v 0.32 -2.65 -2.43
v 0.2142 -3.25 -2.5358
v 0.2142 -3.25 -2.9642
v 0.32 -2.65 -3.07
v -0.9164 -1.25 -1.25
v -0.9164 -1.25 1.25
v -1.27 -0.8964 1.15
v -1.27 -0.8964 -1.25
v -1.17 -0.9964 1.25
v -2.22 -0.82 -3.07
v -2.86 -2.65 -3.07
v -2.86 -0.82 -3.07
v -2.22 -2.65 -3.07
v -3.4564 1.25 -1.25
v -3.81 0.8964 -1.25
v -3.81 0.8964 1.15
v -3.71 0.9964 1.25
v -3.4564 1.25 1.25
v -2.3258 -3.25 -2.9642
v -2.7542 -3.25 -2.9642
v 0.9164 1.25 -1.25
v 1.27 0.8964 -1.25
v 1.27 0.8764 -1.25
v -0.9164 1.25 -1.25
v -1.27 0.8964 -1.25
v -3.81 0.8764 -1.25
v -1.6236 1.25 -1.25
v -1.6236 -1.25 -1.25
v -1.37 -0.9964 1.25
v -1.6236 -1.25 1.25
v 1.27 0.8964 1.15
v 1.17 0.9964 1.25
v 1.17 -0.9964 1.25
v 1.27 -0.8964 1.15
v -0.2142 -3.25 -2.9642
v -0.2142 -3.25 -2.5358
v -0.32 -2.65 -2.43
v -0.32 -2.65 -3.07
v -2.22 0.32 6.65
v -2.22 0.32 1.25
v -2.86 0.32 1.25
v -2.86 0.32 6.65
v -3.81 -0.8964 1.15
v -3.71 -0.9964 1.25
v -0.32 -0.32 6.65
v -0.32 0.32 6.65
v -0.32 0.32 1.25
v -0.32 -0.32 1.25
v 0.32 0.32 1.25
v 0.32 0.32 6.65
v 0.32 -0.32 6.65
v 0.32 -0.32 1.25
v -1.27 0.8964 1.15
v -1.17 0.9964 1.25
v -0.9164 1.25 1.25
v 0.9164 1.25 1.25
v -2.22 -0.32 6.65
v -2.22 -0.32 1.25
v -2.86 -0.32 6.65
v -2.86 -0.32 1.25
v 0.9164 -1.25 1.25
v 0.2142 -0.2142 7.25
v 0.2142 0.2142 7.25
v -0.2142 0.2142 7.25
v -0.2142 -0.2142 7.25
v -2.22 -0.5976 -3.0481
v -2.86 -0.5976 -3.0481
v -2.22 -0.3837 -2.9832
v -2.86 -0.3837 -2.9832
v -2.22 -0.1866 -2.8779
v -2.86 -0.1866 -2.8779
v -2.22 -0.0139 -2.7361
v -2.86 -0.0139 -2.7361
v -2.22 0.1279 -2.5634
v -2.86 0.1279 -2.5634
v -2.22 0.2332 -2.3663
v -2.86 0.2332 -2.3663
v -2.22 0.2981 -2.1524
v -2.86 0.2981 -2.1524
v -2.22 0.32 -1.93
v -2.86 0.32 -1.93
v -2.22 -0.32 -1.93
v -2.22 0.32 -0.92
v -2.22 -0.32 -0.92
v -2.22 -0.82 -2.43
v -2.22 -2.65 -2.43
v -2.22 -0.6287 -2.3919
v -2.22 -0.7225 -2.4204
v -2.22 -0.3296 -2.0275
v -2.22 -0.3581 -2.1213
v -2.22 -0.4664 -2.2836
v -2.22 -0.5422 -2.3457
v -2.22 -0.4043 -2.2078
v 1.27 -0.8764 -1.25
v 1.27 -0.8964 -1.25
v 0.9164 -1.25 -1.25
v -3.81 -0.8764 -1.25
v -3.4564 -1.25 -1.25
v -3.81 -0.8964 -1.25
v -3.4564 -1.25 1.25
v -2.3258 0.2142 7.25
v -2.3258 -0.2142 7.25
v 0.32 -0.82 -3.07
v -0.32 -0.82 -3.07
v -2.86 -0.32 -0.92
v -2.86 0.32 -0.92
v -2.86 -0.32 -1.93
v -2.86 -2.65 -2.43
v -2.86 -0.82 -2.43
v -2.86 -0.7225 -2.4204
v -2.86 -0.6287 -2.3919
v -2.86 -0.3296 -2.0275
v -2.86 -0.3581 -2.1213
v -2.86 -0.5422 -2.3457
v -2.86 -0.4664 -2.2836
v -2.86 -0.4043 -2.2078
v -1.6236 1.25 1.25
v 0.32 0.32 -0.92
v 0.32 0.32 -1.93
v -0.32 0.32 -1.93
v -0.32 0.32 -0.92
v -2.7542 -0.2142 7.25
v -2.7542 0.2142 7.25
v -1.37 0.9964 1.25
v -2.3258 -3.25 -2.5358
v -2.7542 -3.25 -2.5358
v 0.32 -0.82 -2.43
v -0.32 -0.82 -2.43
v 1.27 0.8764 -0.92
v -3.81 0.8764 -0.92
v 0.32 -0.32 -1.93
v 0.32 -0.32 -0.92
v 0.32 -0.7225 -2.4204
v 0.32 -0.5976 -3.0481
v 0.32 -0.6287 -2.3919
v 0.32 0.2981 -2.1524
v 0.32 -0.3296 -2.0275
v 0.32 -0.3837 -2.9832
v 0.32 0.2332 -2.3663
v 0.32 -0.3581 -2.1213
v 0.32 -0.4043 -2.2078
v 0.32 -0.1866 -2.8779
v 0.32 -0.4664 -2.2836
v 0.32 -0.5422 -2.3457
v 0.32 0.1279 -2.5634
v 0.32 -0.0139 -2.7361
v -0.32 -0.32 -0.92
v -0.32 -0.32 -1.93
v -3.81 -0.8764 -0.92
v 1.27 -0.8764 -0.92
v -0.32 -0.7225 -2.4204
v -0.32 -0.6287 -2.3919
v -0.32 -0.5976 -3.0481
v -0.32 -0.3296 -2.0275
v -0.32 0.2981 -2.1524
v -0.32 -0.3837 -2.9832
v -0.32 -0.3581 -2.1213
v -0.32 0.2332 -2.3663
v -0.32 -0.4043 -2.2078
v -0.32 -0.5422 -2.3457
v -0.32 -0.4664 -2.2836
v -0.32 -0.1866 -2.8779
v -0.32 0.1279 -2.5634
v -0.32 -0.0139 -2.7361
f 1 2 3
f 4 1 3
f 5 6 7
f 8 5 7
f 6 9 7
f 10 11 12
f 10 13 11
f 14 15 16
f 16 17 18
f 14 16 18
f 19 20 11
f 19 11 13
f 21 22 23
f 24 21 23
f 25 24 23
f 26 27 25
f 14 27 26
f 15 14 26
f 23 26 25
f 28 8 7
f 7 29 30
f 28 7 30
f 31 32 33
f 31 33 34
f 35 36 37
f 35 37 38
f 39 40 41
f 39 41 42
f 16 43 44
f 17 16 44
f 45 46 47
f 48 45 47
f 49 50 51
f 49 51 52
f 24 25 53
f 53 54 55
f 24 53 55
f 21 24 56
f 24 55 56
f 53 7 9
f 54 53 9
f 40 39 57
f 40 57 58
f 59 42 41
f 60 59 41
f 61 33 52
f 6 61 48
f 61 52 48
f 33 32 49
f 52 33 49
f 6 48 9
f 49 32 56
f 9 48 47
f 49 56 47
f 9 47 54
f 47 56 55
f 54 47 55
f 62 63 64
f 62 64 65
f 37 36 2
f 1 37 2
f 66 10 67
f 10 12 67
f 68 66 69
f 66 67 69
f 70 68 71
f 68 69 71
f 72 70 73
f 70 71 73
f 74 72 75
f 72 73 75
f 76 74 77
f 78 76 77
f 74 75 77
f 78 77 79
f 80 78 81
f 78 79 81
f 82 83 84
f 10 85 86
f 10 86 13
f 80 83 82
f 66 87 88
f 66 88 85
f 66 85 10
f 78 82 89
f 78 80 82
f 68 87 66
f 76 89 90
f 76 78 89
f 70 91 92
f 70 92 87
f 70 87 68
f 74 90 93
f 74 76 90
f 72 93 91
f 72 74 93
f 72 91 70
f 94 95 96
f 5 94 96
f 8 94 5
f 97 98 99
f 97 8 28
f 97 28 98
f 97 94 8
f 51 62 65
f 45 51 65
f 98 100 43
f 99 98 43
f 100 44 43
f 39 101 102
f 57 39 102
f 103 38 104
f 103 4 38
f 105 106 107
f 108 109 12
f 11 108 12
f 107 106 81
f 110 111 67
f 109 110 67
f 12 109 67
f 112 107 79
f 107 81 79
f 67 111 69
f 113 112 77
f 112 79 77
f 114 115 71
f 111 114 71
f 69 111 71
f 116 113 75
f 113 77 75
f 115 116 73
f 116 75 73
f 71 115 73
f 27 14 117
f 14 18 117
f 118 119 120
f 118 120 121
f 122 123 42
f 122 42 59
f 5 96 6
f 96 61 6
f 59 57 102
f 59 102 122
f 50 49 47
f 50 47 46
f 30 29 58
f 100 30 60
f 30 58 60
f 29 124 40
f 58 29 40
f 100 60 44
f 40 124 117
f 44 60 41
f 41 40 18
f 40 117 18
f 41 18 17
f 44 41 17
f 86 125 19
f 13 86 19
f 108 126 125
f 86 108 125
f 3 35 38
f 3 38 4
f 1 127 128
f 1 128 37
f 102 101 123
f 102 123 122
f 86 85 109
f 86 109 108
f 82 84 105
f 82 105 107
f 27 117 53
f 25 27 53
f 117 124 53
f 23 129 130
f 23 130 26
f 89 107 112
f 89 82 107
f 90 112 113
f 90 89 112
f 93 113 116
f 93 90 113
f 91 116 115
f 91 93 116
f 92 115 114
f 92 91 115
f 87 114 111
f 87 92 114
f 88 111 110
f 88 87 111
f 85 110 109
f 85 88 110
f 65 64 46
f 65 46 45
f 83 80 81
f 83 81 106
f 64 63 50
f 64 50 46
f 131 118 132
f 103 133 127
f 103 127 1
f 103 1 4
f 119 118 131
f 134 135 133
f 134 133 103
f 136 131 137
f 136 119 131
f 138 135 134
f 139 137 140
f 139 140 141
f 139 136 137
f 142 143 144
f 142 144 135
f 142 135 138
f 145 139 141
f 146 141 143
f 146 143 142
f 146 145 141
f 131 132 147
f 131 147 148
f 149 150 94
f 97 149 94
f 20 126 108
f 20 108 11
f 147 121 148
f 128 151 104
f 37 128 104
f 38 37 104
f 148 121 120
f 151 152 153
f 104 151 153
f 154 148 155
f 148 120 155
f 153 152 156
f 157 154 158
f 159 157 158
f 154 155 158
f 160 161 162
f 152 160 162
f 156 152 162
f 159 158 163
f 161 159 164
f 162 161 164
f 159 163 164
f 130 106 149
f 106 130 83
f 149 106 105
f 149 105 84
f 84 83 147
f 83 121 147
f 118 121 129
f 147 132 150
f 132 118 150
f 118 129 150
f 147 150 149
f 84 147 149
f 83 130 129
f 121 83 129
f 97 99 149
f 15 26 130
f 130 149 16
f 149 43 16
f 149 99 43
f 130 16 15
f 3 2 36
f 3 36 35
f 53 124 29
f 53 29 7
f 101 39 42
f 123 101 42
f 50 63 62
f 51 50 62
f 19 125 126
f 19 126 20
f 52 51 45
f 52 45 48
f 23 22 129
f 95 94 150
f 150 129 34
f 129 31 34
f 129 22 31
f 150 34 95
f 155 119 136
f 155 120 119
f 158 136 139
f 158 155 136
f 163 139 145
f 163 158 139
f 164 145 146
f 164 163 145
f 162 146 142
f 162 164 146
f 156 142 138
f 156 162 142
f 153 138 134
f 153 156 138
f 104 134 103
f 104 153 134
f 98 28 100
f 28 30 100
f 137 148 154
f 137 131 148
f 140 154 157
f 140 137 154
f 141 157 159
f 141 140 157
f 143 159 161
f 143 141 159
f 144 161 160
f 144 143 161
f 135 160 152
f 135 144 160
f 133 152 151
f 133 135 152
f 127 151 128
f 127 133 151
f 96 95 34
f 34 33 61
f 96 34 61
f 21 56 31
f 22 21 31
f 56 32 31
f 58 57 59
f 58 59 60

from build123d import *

# Parameters (mm, degrees)
EXTRUDE1_DEPTH          = 1.25
CUT_EXTRUDE3_DEPTH      = 2.25
LPATTERN4_COUNT         = 2
LPATTERN4_PITCH         = 2.54
SKETCH2_W               = 1.752893218
SKETCH2_H               = 0.33
CUT_EXTRUDE1_DEPTH      = 2.27
CUT_EXTRUDE1_DEPTH_BACK = 4.81
EXTRUDE_THIN1_DEPTH     = 0.32
LPATTERN5_COUNT         = 2
LPATTERN5_PITCH         = 2.54
CHAMFER2_SIZE           = 0.6
CHAMFER2_SIZE2          = 0.105796188
CHAMFER2_PART_2_SIZE    = 0.6
CHAMFER2_PART_2_SIZE2   = 0.105796188
CHAMFER2_PART_3_SIZE    = 0.6
CHAMFER2_PART_3_SIZE2   = 0.105796188
CHAMFER2_PART_4_SIZE    = 0.6
CHAMFER2_PART_4_SIZE2   = 0.105796188
CHAMFER2_PART_5_SIZE    = 0.6
CHAMFER2_PART_5_SIZE2   = 0.105796188
CHAMFER2_PART_6_SIZE    = 0.6
CHAMFER2_PART_6_SIZE2   = 0.105796188
CHAMFER2_PART_7_SIZE    = 0.6
CHAMFER2_PART_7_SIZE2   = 0.105796188
CHAMFER2_PART_8_SIZE    = 0.6
CHAMFER2_PART_8_SIZE2   = 0.105796188
CHAMFER2_PART_9_SIZE    = 0.6
CHAMFER2_PART_9_SIZE2   = 0.105796188
CHAMFER2_PART_10_SIZE   = 0.6
CHAMFER2_PART_10_SIZE2  = 0.105796188
CHAMFER2_PART_11_SIZE   = 0.6
CHAMFER2_PART_11_SIZE2  = 0.105796188
CHAMFER2_PART_12_SIZE   = 0.6
CHAMFER2_PART_12_SIZE2  = 0.105796188
CHAMFER2_PART_13_SIZE   = 0.6
CHAMFER2_PART_13_SIZE2  = 0.105796188
CHAMFER2_PART_14_SIZE   = 0.6
CHAMFER2_PART_14_SIZE2  = 0.105796188
CHAMFER2_PART_15_SIZE   = 0.6
CHAMFER2_PART_15_SIZE2  = 0.105796188
CHAMFER2_PART_16_SIZE   = 0.6
CHAMFER2_PART_16_SIZE2  = 0.105796188
FILLET1_R               = 0.5
FILLET2_R               = 1.14


with BuildPart() as part:
    # Sketch1 → Extrude1 (new body, symmetric)
    with BuildSketch(Plane.XY):
        Polygon((-1.27, 0.896446609), (-0.916446609, 1.25), (0.916446609, 1.25), (1.27, 0.896446609), (1.27, -0.896446609), (0.916446609, -1.25), (-0.916446609, -1.25), (-1.27, -0.896446609), align=None)
    extrude1 = extrude(amount=EXTRUDE1_DEPTH, both=True)

    # Sketch4 → Cut-Extrude3 (cut, symmetric)
    with BuildSketch(Plane(origin=(0, 0, 0), x_dir=(1, 0, 0), z_dir=(0, 1, 0))):
        Polygon((-1.27, -1.15), (-1.17, -1.25), (-1.27, -1.25), align=None)
        Polygon((1.17, -1.25), (1.27, -1.15), (1.27, -1.25), align=None)
    cut_extrude3 = extrude(amount=CUT_EXTRUDE3_DEPTH, both=True, mode=Mode.SUBTRACT)

    # LPattern4: Extrude1, Cut-Extrude3 ×2
    with Locations(*[(-i * LPATTERN4_PITCH, 0, 0) for i in range(1, LPATTERN4_COUNT)]):
        add(extrude1)
        add(cut_extrude3, mode=Mode.SUBTRACT)

    # Sketch2 → Cut-Extrude1 (cut, two sides)
    with BuildSketch(Plane(origin=(0, 0, 0), x_dir=(0, -1, 0), z_dir=(1, 0, 0))) as cut_extrude1_sk:
        with Locations((0, 1.085)):
            Rectangle(SKETCH2_W, SKETCH2_H)
    extrude(amount=CUT_EXTRUDE1_DEPTH, mode=Mode.SUBTRACT)
    extrude(cut_extrude1_sk.sketch, amount=-CUT_EXTRUDE1_DEPTH_BACK, mode=Mode.SUBTRACT)

    # Sketch3 → Extrude-Thin1 (add, symmetric)
    with BuildSketch(Plane(origin=(0, 0, 0), x_dir=(0, 0, -1), z_dir=(1, 0, 0))):
        Polygon((-7.25, -0.32), (2.43, -0.32), (2.43, -3.25), (3.07, -3.25), (3.07, 0.32), (-7.25, 0.32), align=None)
    extrude_thin1 = extrude(amount=EXTRUDE_THIN1_DEPTH, both=True)

    # LPattern5: Extrude-Thin1 ×2
    with Locations(*[(-i * LPATTERN5_PITCH, 0, 0) for i in range(1, LPATTERN5_COUNT)]):
        add(extrude_thin1)

    # Chamfer2
    chamfer2_edges = [part.edges().sort_by_distance(p)[0] for p in [
        (0, -0.32, 7.25),
    ]]
    chamfer2_side = [part.faces().sort_by_distance(p)[0] for p in [
        (0, -0.32, 4.25),
    ]]
    chamfer(chamfer2_edges, length=CHAMFER2_SIZE, length2=CHAMFER2_SIZE2, reference=chamfer2_side[0])

    # Chamfer2 part 2
    chamfer2_part_2_edges = [part.edges().sort_by_distance(p)[0] for p in [
        (-0.32, 0, 7.25),
    ]]
    chamfer2_part_2_side = [part.faces().sort_by_distance(p)[0] for p in [
        (-0.32, 0, 4.25),
    ]]
    chamfer(chamfer2_part_2_edges, length=CHAMFER2_PART_2_SIZE, length2=CHAMFER2_PART_2_SIZE2, reference=chamfer2_part_2_side[0])

    # Chamfer2 part 3
    chamfer2_part_3_edges = [part.edges().sort_by_distance(p)[0] for p in [
        (-0.32, -3.25, -2.75),
    ]]
    chamfer2_part_3_side = [part.faces().sort_by_distance(p)[0] for p in [
        (-0.32, -1.029537402, -2.430462598),
    ]]
    chamfer(chamfer2_part_3_edges, length=CHAMFER2_PART_3_SIZE, length2=CHAMFER2_PART_3_SIZE2, reference=chamfer2_part_3_side[0])

    # Chamfer2 part 4
    chamfer2_part_4_edges = [part.edges().sort_by_distance(p)[0] for p in [
        (0, -3.25, -2.43),
    ]]
    chamfer2_part_4_side = [part.faces().sort_by_distance(p)[0] for p in [
        (0, -1.785, -2.43),
    ]]
    chamfer(chamfer2_part_4_edges, length=CHAMFER2_PART_4_SIZE, length2=CHAMFER2_PART_4_SIZE2, reference=chamfer2_part_4_side[0])

    # Chamfer2 part 5
    chamfer2_part_5_edges = [part.edges().sort_by_distance(p)[0] for p in [
        (0.32, -3.25, -2.75),
    ]]
    chamfer2_part_5_side = [part.faces().sort_by_distance(p)[0] for p in [
        (0.32, -1.029537402, -2.430462598),
    ]]
    chamfer(chamfer2_part_5_edges, length=CHAMFER2_PART_5_SIZE, length2=CHAMFER2_PART_5_SIZE2, reference=chamfer2_part_5_side[0])

    # Chamfer2 part 6
    chamfer2_part_6_edges = [part.edges().sort_by_distance(p)[0] for p in [
        (0, -3.25, -3.07),
    ]]
    chamfer2_part_6_side = [part.faces().sort_by_distance(p)[0] for p in [
        (0, -1.465, -3.07),
    ]]
    chamfer(chamfer2_part_6_edges, length=CHAMFER2_PART_6_SIZE, length2=CHAMFER2_PART_6_SIZE2, reference=chamfer2_part_6_side[0])

    # Chamfer2 part 7
    chamfer2_part_7_edges = [part.edges().sort_by_distance(p)[0] for p in [
        (0, 0.32, 7.25),
    ]]
    chamfer2_part_7_side = [part.faces().sort_by_distance(p)[0] for p in [
        (0, 0.32, 4.25),
    ]]
    chamfer(chamfer2_part_7_edges, length=CHAMFER2_PART_7_SIZE, length2=CHAMFER2_PART_7_SIZE2, reference=chamfer2_part_7_side[0])

    # Chamfer2 part 8
    chamfer2_part_8_edges = [part.edges().sort_by_distance(p)[0] for p in [
        (0.32, 0, 7.25),
    ]]
    chamfer2_part_8_side = [part.faces().sort_by_distance(p)[0] for p in [
        (0.32, 0, 4.25),
    ]]
    chamfer(chamfer2_part_8_edges, length=CHAMFER2_PART_8_SIZE, length2=CHAMFER2_PART_8_SIZE2, reference=chamfer2_part_8_side[0])

    # Chamfer2 part 9
    chamfer2_part_9_edges = [part.edges().sort_by_distance(p)[0] for p in [
        (-2.54, -0.32, 7.25),
    ]]
    chamfer2_part_9_side = [part.faces().sort_by_distance(p)[0] for p in [
        (-2.54, -0.32, 4.25),
    ]]
    chamfer(chamfer2_part_9_edges, length=CHAMFER2_PART_9_SIZE, length2=CHAMFER2_PART_9_SIZE2, reference=chamfer2_part_9_side[0])

    # Chamfer2 part 10
    chamfer2_part_10_edges = [part.edges().sort_by_distance(p)[0] for p in [
        (-2.86, 0, 7.25),
    ]]
    chamfer2_part_10_side = [part.faces().sort_by_distance(p)[0] for p in [
        (-2.86, 0, 4.25),
    ]]
    chamfer(chamfer2_part_10_edges, length=CHAMFER2_PART_10_SIZE, length2=CHAMFER2_PART_10_SIZE2, reference=chamfer2_part_10_side[0])

    # Chamfer2 part 11
    chamfer2_part_11_edges = [part.edges().sort_by_distance(p)[0] for p in [
        (-2.86, -3.25, -2.75),
    ]]
    chamfer2_part_11_side = [part.faces().sort_by_distance(p)[0] for p in [
        (-2.86, -1.029537402, -2.430462598),
    ]]
    chamfer(chamfer2_part_11_edges, length=CHAMFER2_PART_11_SIZE, length2=CHAMFER2_PART_11_SIZE2, reference=chamfer2_part_11_side[0])

    # Chamfer2 part 12
    chamfer2_part_12_edges = [part.edges().sort_by_distance(p)[0] for p in [
        (-2.54, -3.25, -2.43),
    ]]
    chamfer2_part_12_side = [part.faces().sort_by_distance(p)[0] for p in [
        (-2.54, -1.785, -2.43),
    ]]
    chamfer(chamfer2_part_12_edges, length=CHAMFER2_PART_12_SIZE, length2=CHAMFER2_PART_12_SIZE2, reference=chamfer2_part_12_side[0])

    # Chamfer2 part 13
    chamfer2_part_13_edges = [part.edges().sort_by_distance(p)[0] for p in [
        (-2.22, -3.25, -2.75),
    ]]
    chamfer2_part_13_side = [part.faces().sort_by_distance(p)[0] for p in [
        (-2.22, -1.029537402, -2.430462598),
    ]]
    chamfer(chamfer2_part_13_edges, length=CHAMFER2_PART_13_SIZE, length2=CHAMFER2_PART_13_SIZE2, reference=chamfer2_part_13_side[0])

    # Chamfer2 part 14
    chamfer2_part_14_edges = [part.edges().sort_by_distance(p)[0] for p in [
        (-2.54, -3.25, -3.07),
    ]]
    chamfer2_part_14_side = [part.faces().sort_by_distance(p)[0] for p in [
        (-2.54, -1.465, -3.07),
    ]]
    chamfer(chamfer2_part_14_edges, length=CHAMFER2_PART_14_SIZE, length2=CHAMFER2_PART_14_SIZE2, reference=chamfer2_part_14_side[0])

    # Chamfer2 part 15
    chamfer2_part_15_edges = [part.edges().sort_by_distance(p)[0] for p in [
        (-2.54, 0.32, 7.25),
    ]]
    chamfer2_part_15_side = [part.faces().sort_by_distance(p)[0] for p in [
        (-2.54, 0.32, 4.25),
    ]]
    chamfer(chamfer2_part_15_edges, length=CHAMFER2_PART_15_SIZE, length2=CHAMFER2_PART_15_SIZE2, reference=chamfer2_part_15_side[0])

    # Chamfer2 part 16
    chamfer2_part_16_edges = [part.edges().sort_by_distance(p)[0] for p in [
        (-2.22, 0, 7.25),
    ]]
    chamfer2_part_16_side = [part.faces().sort_by_distance(p)[0] for p in [
        (-2.22, 0, 4.25),
    ]]
    chamfer(chamfer2_part_16_edges, length=CHAMFER2_PART_16_SIZE, length2=CHAMFER2_PART_16_SIZE2, reference=chamfer2_part_16_side[0])

    # Fillet1
    fillet1_edges = [part.edges().sort_by_distance(p)[0] for p in [
        (0, -0.32, -2.43),
        (-2.54, -0.32, -2.43),
    ]]
    fillet(fillet1_edges, radius=FILLET1_R)

    # Fillet2
    fillet2_edges = [part.edges().sort_by_distance(p)[0] for p in [
        (0, 0.32, -3.07),
        (-2.54, 0.32, -3.07),
    ]]
    fillet(fillet2_edges, radius=FILLET2_R)


solid = part.part
